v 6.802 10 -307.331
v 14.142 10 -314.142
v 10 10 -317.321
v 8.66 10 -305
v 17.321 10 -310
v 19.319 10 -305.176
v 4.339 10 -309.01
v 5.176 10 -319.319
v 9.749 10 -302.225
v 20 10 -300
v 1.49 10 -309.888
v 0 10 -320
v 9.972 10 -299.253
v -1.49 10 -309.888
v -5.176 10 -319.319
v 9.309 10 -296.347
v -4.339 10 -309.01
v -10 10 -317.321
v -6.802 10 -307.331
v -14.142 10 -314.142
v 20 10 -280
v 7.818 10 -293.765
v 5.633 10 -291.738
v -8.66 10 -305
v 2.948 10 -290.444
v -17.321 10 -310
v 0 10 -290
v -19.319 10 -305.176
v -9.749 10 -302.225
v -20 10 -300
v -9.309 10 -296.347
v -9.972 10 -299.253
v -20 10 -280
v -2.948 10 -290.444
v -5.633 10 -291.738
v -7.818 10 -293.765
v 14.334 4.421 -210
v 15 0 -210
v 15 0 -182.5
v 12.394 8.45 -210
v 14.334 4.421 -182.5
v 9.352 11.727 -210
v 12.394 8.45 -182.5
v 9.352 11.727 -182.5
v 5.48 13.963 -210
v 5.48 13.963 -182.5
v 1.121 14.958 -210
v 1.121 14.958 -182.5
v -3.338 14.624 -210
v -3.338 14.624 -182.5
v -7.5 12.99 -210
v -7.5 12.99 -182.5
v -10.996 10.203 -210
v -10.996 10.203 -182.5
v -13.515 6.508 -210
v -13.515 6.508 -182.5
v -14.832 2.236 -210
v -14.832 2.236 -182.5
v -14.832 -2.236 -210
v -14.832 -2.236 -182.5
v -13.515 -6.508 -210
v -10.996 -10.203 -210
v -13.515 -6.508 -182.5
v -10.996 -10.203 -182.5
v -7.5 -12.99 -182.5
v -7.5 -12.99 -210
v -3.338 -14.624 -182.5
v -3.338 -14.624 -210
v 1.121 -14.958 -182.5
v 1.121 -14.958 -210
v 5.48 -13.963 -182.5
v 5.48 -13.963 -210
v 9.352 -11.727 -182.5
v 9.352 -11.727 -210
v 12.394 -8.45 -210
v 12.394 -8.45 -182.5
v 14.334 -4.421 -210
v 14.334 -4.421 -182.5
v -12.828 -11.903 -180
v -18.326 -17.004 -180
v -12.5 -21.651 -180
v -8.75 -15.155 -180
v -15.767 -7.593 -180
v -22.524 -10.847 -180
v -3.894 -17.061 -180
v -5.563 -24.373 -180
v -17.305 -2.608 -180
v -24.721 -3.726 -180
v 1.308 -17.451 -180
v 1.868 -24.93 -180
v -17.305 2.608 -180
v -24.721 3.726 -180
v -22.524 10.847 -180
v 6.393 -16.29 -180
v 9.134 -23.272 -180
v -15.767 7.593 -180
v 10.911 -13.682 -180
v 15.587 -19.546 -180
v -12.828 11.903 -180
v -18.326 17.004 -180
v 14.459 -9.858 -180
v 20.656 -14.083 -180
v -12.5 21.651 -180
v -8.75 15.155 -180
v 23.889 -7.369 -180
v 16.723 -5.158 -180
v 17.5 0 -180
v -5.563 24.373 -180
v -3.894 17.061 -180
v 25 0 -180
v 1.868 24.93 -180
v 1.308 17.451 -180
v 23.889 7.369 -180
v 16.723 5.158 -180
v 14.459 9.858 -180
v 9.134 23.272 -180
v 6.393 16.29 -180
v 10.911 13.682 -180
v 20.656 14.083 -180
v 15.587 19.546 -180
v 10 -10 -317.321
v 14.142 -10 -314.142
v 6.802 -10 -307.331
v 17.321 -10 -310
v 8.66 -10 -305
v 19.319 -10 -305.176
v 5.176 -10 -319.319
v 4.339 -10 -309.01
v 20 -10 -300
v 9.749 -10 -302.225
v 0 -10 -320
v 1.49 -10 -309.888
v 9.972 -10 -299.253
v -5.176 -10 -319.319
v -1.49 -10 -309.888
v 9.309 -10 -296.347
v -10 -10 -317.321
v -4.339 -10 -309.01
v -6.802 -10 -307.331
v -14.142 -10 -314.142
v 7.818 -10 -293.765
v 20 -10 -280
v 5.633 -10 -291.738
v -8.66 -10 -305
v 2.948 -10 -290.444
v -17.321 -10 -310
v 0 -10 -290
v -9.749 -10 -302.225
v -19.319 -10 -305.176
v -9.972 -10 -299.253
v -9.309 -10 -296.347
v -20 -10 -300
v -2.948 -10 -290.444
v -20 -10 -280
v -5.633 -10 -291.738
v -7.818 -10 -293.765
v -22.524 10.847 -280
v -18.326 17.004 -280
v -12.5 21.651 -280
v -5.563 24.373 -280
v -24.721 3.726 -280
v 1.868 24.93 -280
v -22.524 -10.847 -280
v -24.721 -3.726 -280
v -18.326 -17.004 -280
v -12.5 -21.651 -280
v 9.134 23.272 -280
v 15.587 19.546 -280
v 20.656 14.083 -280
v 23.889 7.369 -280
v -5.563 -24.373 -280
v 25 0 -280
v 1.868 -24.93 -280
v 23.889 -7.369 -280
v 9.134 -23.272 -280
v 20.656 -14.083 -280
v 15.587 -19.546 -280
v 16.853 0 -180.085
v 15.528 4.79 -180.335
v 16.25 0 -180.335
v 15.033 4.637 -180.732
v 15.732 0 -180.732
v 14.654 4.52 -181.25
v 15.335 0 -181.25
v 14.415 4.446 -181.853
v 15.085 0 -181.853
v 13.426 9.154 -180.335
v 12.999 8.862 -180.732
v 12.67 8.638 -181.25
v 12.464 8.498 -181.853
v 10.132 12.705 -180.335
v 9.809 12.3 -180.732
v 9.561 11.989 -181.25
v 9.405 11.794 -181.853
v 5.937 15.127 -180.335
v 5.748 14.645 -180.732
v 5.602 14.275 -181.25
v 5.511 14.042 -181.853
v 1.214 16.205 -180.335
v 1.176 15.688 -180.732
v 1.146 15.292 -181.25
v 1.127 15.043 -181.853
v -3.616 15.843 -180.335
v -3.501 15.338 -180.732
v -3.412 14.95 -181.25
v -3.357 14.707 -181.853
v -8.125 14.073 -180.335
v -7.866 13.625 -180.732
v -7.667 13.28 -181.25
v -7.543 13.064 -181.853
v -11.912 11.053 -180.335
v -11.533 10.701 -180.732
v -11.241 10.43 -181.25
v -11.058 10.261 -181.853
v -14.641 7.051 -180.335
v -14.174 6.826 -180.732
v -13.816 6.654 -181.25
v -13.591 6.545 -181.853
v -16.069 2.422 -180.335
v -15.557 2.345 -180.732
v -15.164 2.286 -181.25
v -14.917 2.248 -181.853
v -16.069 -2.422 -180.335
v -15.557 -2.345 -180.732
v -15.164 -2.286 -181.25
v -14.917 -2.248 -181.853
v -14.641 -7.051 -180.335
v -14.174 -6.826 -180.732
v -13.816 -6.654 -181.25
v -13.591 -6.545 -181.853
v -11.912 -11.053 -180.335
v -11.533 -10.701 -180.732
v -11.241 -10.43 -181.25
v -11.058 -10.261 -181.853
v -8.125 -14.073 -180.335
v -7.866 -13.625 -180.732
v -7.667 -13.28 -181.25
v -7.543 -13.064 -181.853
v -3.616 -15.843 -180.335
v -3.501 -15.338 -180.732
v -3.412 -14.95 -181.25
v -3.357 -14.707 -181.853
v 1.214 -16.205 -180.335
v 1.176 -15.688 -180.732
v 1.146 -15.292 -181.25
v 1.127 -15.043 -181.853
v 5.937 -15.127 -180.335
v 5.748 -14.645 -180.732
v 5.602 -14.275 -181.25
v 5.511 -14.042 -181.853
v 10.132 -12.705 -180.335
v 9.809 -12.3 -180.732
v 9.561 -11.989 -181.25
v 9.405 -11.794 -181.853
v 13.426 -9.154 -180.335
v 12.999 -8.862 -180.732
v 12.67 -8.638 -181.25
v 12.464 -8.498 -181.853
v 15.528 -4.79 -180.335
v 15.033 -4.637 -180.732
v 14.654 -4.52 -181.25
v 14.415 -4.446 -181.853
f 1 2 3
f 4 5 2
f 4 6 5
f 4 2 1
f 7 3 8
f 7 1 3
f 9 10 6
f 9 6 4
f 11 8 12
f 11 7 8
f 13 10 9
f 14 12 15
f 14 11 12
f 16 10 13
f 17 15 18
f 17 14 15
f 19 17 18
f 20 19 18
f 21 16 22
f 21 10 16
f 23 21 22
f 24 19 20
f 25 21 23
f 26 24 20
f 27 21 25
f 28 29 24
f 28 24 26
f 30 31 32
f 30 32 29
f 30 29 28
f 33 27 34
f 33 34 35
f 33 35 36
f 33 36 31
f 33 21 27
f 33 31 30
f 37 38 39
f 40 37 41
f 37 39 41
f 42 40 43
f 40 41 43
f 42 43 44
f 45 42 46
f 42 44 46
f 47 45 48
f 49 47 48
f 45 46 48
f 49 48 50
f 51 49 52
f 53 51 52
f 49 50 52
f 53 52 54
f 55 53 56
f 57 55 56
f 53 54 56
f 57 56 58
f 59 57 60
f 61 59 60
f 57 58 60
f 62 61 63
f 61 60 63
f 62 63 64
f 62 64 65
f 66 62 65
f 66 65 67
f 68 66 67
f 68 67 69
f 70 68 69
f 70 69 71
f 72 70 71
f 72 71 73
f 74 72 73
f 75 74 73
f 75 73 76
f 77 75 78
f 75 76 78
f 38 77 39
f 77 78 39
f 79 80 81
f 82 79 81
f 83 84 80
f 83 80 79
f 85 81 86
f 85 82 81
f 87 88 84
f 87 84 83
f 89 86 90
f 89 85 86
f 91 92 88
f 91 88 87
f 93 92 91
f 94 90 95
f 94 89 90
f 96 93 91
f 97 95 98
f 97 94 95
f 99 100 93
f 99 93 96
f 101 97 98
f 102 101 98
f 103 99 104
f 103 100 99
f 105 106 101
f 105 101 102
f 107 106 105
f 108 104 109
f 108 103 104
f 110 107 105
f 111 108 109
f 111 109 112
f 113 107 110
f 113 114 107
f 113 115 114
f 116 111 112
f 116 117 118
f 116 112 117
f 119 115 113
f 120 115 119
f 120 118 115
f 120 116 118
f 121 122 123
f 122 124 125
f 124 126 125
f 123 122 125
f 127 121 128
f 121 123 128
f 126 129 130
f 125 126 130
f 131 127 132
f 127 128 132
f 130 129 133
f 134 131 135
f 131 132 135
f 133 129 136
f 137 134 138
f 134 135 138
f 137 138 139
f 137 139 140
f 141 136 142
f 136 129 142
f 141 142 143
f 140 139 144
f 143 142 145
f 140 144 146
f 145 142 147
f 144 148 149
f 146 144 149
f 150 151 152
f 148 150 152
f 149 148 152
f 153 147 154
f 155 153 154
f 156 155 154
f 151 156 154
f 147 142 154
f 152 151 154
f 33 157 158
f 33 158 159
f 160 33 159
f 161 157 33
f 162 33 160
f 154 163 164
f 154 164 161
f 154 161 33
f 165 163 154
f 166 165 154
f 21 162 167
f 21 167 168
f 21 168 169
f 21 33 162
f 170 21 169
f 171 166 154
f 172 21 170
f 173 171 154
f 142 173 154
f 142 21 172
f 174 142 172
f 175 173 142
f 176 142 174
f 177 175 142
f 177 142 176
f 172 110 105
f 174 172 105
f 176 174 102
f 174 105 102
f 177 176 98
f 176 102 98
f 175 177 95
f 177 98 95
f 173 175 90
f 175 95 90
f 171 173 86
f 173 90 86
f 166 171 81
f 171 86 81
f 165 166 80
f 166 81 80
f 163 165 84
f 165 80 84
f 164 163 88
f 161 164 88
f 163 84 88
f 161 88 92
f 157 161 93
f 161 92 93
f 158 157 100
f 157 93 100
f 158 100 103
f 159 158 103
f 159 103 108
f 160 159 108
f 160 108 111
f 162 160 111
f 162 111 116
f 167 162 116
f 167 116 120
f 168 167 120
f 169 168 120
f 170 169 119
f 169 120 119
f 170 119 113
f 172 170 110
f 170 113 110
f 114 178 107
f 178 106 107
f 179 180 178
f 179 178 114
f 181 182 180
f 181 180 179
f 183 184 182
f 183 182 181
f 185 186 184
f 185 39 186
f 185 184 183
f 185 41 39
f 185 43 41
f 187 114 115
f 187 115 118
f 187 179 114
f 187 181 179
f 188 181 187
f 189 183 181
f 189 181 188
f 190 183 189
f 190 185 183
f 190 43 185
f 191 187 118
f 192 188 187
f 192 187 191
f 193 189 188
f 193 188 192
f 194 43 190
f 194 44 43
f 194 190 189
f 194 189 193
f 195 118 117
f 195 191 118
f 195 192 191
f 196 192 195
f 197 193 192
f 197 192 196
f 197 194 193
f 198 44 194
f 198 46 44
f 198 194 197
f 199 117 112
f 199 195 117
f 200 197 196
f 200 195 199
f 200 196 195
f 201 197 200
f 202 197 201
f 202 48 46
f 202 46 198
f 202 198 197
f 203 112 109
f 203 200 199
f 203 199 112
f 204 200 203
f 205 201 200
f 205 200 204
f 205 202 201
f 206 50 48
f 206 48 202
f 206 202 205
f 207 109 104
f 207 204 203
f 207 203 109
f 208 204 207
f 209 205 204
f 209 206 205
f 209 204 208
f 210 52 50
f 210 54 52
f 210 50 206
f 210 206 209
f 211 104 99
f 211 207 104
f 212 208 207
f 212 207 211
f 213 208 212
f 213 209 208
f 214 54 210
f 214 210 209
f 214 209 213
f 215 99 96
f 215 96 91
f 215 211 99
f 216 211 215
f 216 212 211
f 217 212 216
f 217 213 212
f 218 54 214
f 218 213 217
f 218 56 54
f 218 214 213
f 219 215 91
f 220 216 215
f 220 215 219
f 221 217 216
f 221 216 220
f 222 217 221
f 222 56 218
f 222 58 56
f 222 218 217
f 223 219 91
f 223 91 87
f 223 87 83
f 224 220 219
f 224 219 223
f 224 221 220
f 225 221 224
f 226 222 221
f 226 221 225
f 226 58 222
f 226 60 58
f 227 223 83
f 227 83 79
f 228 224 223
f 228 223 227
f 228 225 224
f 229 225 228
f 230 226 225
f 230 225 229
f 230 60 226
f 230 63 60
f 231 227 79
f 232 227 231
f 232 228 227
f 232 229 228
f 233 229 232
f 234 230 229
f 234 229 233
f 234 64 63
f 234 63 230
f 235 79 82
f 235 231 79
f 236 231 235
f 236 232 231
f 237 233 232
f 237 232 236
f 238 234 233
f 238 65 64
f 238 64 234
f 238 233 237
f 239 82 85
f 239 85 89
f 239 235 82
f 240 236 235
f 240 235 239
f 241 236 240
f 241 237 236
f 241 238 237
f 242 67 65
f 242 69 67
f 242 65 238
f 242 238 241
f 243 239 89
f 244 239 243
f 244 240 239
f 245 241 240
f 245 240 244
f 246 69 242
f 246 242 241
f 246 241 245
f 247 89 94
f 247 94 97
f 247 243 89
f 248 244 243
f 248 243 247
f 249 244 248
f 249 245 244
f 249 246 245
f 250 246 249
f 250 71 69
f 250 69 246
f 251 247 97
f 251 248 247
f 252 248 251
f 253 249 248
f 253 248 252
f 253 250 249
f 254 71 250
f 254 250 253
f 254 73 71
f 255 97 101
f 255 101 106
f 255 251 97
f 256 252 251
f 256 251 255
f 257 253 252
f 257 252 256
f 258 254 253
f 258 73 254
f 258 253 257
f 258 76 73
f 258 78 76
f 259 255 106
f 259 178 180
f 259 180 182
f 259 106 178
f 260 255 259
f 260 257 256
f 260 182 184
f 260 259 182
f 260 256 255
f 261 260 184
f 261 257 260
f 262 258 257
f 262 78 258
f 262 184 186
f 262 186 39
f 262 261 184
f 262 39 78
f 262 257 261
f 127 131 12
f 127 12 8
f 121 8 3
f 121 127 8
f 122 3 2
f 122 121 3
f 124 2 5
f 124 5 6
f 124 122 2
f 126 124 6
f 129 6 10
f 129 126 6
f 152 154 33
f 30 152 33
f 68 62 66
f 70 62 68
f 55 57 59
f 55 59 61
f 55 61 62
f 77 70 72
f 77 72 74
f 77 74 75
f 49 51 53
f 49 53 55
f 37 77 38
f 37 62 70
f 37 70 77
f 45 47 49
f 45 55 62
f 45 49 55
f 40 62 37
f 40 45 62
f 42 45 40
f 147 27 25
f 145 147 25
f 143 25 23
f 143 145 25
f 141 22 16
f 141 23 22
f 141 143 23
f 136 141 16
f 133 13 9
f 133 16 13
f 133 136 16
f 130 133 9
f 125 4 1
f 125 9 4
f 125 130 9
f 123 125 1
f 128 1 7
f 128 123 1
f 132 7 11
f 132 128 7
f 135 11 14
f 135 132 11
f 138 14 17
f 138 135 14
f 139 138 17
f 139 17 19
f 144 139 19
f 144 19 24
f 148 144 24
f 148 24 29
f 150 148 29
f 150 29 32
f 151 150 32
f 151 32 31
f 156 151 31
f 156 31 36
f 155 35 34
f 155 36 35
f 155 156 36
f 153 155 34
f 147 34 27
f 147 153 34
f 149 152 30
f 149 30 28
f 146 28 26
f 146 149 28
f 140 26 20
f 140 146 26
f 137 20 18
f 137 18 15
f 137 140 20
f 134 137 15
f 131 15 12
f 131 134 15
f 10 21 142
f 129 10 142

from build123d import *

# Parameters (mm, degrees)
SKETCH_1_R               = 25
EXTRUDE_1_DEPTH          = 30
SKETCH_2_R               = 25
EXTRUDE_2_DEPTH          = 250
SKETCH_3_W               = 40
SKETCH_3_H               = 10
EXTRUDE_4_DEPTH          = 40
CUT_EXTRUDE_1_DEPTH      = 323.877685819
CUT_EXTRUDE_1_DEPTH_BACK = 323.877685819
CUT_EXTRUDE_2_DEPTH      = 323.877685819
CUT_EXTRUDE_2_DEPTH_BACK = 323.877685819
SKETCH_7_R               = 10
SKETCH_8_R               = 25
CUT_EXTRUDE_3_DEPTH      = 180
SKETCH_9_R               = 15
CUT_EXTRUDE_4_DEPTH      = 30
FILLET_1_R               = 2.5


with BuildPart() as part:
    # 스케치1 → 보스-돌출1 (new body)
    with BuildSketch(Plane.XY):
        Circle(SKETCH_1_R)
    extrude(amount=-EXTRUDE_1_DEPTH)

    # 스케치2 → 보스-돌출2 (add)
    with BuildSketch(Plane(origin=(0, 0, -30), x_dir=(-1, 0, 0), z_dir=(0, 0, -1))):
        with Locations(Location((0, 0, 0), (0, 0, 180))):
            Circle(SKETCH_2_R)
    extrude(amount=EXTRUDE_2_DEPTH)

    # 스케치3 → 보스-돌출4 (add)
    with BuildSketch(Plane(origin=(0, 0, -280), x_dir=(-1, 0, 0), z_dir=(0, 0, -1))):
        with Locations((0, -5)):
            Rectangle(SKETCH_3_W, SKETCH_3_H)
        with Locations((0, 5)):
            Rectangle(SKETCH_3_W, SKETCH_3_H)
    extrude(amount=EXTRUDE_4_DEPTH)

    # 스케치6 → 컷-돌출1 (cut, two sides: drawn at the far end of the back side and taken through both)
    with BuildSketch(Plane(origin=(0, 10, 0), x_dir=(1, 0, 0), z_dir=(0, 1, 0)).offset(-CUT_EXTRUDE_1_DEPTH_BACK)):
        with BuildLine():
            ThreePointArc((-20, 300), (-14.142135624, 314.142135624), (0, 320))
            Line((0, 320), (-20, 320))
            Line((-20, 320), (-20, 300))
        make_face()
        with BuildLine():
            Line((20, 320), (0, 320))
            ThreePointArc((0, 320), (14.142135624, 314.142135624), (20, 300))
            Line((20, 300), (20, 320))
        make_face()
    extrude(amount=CUT_EXTRUDE_1_DEPTH + CUT_EXTRUDE_1_DEPTH_BACK, mode=Mode.SUBTRACT)

    # 스케치7 → 컷-돌출2 (cut, two sides: drawn at the far end of the back side and taken through both)
    with BuildSketch(Plane(origin=(0, 10, 0), x_dir=(1, 0, 0), z_dir=(0, 1, 0)).offset(-CUT_EXTRUDE_2_DEPTH_BACK)):
        with Locations(Location((0, 300, 0), (0, 0, 270))):
            Circle(SKETCH_7_R)
    extrude(amount=CUT_EXTRUDE_2_DEPTH + CUT_EXTRUDE_2_DEPTH_BACK, mode=Mode.SUBTRACT)

    # 스케치8 → 컷-돌출3 (cut)
    with BuildSketch(Plane.XY):
        Circle(SKETCH_8_R)
    extrude(amount=-CUT_EXTRUDE_3_DEPTH, mode=Mode.SUBTRACT)

    # 스케치9 → 컷-돌출4 (cut)
    with BuildSketch(Plane.XY.offset(-180)):
        Circle(SKETCH_9_R)
    extrude(amount=-CUT_EXTRUDE_4_DEPTH, mode=Mode.SUBTRACT)

    # 필렛1
    fillet_1_edges = [part.edges().sort_by_distance(p)[0] for p in [
        (-15, 0, -180),
    ]]
    fillet(fillet_1_edges, radius=FILLET_1_R)


solid = part.part
